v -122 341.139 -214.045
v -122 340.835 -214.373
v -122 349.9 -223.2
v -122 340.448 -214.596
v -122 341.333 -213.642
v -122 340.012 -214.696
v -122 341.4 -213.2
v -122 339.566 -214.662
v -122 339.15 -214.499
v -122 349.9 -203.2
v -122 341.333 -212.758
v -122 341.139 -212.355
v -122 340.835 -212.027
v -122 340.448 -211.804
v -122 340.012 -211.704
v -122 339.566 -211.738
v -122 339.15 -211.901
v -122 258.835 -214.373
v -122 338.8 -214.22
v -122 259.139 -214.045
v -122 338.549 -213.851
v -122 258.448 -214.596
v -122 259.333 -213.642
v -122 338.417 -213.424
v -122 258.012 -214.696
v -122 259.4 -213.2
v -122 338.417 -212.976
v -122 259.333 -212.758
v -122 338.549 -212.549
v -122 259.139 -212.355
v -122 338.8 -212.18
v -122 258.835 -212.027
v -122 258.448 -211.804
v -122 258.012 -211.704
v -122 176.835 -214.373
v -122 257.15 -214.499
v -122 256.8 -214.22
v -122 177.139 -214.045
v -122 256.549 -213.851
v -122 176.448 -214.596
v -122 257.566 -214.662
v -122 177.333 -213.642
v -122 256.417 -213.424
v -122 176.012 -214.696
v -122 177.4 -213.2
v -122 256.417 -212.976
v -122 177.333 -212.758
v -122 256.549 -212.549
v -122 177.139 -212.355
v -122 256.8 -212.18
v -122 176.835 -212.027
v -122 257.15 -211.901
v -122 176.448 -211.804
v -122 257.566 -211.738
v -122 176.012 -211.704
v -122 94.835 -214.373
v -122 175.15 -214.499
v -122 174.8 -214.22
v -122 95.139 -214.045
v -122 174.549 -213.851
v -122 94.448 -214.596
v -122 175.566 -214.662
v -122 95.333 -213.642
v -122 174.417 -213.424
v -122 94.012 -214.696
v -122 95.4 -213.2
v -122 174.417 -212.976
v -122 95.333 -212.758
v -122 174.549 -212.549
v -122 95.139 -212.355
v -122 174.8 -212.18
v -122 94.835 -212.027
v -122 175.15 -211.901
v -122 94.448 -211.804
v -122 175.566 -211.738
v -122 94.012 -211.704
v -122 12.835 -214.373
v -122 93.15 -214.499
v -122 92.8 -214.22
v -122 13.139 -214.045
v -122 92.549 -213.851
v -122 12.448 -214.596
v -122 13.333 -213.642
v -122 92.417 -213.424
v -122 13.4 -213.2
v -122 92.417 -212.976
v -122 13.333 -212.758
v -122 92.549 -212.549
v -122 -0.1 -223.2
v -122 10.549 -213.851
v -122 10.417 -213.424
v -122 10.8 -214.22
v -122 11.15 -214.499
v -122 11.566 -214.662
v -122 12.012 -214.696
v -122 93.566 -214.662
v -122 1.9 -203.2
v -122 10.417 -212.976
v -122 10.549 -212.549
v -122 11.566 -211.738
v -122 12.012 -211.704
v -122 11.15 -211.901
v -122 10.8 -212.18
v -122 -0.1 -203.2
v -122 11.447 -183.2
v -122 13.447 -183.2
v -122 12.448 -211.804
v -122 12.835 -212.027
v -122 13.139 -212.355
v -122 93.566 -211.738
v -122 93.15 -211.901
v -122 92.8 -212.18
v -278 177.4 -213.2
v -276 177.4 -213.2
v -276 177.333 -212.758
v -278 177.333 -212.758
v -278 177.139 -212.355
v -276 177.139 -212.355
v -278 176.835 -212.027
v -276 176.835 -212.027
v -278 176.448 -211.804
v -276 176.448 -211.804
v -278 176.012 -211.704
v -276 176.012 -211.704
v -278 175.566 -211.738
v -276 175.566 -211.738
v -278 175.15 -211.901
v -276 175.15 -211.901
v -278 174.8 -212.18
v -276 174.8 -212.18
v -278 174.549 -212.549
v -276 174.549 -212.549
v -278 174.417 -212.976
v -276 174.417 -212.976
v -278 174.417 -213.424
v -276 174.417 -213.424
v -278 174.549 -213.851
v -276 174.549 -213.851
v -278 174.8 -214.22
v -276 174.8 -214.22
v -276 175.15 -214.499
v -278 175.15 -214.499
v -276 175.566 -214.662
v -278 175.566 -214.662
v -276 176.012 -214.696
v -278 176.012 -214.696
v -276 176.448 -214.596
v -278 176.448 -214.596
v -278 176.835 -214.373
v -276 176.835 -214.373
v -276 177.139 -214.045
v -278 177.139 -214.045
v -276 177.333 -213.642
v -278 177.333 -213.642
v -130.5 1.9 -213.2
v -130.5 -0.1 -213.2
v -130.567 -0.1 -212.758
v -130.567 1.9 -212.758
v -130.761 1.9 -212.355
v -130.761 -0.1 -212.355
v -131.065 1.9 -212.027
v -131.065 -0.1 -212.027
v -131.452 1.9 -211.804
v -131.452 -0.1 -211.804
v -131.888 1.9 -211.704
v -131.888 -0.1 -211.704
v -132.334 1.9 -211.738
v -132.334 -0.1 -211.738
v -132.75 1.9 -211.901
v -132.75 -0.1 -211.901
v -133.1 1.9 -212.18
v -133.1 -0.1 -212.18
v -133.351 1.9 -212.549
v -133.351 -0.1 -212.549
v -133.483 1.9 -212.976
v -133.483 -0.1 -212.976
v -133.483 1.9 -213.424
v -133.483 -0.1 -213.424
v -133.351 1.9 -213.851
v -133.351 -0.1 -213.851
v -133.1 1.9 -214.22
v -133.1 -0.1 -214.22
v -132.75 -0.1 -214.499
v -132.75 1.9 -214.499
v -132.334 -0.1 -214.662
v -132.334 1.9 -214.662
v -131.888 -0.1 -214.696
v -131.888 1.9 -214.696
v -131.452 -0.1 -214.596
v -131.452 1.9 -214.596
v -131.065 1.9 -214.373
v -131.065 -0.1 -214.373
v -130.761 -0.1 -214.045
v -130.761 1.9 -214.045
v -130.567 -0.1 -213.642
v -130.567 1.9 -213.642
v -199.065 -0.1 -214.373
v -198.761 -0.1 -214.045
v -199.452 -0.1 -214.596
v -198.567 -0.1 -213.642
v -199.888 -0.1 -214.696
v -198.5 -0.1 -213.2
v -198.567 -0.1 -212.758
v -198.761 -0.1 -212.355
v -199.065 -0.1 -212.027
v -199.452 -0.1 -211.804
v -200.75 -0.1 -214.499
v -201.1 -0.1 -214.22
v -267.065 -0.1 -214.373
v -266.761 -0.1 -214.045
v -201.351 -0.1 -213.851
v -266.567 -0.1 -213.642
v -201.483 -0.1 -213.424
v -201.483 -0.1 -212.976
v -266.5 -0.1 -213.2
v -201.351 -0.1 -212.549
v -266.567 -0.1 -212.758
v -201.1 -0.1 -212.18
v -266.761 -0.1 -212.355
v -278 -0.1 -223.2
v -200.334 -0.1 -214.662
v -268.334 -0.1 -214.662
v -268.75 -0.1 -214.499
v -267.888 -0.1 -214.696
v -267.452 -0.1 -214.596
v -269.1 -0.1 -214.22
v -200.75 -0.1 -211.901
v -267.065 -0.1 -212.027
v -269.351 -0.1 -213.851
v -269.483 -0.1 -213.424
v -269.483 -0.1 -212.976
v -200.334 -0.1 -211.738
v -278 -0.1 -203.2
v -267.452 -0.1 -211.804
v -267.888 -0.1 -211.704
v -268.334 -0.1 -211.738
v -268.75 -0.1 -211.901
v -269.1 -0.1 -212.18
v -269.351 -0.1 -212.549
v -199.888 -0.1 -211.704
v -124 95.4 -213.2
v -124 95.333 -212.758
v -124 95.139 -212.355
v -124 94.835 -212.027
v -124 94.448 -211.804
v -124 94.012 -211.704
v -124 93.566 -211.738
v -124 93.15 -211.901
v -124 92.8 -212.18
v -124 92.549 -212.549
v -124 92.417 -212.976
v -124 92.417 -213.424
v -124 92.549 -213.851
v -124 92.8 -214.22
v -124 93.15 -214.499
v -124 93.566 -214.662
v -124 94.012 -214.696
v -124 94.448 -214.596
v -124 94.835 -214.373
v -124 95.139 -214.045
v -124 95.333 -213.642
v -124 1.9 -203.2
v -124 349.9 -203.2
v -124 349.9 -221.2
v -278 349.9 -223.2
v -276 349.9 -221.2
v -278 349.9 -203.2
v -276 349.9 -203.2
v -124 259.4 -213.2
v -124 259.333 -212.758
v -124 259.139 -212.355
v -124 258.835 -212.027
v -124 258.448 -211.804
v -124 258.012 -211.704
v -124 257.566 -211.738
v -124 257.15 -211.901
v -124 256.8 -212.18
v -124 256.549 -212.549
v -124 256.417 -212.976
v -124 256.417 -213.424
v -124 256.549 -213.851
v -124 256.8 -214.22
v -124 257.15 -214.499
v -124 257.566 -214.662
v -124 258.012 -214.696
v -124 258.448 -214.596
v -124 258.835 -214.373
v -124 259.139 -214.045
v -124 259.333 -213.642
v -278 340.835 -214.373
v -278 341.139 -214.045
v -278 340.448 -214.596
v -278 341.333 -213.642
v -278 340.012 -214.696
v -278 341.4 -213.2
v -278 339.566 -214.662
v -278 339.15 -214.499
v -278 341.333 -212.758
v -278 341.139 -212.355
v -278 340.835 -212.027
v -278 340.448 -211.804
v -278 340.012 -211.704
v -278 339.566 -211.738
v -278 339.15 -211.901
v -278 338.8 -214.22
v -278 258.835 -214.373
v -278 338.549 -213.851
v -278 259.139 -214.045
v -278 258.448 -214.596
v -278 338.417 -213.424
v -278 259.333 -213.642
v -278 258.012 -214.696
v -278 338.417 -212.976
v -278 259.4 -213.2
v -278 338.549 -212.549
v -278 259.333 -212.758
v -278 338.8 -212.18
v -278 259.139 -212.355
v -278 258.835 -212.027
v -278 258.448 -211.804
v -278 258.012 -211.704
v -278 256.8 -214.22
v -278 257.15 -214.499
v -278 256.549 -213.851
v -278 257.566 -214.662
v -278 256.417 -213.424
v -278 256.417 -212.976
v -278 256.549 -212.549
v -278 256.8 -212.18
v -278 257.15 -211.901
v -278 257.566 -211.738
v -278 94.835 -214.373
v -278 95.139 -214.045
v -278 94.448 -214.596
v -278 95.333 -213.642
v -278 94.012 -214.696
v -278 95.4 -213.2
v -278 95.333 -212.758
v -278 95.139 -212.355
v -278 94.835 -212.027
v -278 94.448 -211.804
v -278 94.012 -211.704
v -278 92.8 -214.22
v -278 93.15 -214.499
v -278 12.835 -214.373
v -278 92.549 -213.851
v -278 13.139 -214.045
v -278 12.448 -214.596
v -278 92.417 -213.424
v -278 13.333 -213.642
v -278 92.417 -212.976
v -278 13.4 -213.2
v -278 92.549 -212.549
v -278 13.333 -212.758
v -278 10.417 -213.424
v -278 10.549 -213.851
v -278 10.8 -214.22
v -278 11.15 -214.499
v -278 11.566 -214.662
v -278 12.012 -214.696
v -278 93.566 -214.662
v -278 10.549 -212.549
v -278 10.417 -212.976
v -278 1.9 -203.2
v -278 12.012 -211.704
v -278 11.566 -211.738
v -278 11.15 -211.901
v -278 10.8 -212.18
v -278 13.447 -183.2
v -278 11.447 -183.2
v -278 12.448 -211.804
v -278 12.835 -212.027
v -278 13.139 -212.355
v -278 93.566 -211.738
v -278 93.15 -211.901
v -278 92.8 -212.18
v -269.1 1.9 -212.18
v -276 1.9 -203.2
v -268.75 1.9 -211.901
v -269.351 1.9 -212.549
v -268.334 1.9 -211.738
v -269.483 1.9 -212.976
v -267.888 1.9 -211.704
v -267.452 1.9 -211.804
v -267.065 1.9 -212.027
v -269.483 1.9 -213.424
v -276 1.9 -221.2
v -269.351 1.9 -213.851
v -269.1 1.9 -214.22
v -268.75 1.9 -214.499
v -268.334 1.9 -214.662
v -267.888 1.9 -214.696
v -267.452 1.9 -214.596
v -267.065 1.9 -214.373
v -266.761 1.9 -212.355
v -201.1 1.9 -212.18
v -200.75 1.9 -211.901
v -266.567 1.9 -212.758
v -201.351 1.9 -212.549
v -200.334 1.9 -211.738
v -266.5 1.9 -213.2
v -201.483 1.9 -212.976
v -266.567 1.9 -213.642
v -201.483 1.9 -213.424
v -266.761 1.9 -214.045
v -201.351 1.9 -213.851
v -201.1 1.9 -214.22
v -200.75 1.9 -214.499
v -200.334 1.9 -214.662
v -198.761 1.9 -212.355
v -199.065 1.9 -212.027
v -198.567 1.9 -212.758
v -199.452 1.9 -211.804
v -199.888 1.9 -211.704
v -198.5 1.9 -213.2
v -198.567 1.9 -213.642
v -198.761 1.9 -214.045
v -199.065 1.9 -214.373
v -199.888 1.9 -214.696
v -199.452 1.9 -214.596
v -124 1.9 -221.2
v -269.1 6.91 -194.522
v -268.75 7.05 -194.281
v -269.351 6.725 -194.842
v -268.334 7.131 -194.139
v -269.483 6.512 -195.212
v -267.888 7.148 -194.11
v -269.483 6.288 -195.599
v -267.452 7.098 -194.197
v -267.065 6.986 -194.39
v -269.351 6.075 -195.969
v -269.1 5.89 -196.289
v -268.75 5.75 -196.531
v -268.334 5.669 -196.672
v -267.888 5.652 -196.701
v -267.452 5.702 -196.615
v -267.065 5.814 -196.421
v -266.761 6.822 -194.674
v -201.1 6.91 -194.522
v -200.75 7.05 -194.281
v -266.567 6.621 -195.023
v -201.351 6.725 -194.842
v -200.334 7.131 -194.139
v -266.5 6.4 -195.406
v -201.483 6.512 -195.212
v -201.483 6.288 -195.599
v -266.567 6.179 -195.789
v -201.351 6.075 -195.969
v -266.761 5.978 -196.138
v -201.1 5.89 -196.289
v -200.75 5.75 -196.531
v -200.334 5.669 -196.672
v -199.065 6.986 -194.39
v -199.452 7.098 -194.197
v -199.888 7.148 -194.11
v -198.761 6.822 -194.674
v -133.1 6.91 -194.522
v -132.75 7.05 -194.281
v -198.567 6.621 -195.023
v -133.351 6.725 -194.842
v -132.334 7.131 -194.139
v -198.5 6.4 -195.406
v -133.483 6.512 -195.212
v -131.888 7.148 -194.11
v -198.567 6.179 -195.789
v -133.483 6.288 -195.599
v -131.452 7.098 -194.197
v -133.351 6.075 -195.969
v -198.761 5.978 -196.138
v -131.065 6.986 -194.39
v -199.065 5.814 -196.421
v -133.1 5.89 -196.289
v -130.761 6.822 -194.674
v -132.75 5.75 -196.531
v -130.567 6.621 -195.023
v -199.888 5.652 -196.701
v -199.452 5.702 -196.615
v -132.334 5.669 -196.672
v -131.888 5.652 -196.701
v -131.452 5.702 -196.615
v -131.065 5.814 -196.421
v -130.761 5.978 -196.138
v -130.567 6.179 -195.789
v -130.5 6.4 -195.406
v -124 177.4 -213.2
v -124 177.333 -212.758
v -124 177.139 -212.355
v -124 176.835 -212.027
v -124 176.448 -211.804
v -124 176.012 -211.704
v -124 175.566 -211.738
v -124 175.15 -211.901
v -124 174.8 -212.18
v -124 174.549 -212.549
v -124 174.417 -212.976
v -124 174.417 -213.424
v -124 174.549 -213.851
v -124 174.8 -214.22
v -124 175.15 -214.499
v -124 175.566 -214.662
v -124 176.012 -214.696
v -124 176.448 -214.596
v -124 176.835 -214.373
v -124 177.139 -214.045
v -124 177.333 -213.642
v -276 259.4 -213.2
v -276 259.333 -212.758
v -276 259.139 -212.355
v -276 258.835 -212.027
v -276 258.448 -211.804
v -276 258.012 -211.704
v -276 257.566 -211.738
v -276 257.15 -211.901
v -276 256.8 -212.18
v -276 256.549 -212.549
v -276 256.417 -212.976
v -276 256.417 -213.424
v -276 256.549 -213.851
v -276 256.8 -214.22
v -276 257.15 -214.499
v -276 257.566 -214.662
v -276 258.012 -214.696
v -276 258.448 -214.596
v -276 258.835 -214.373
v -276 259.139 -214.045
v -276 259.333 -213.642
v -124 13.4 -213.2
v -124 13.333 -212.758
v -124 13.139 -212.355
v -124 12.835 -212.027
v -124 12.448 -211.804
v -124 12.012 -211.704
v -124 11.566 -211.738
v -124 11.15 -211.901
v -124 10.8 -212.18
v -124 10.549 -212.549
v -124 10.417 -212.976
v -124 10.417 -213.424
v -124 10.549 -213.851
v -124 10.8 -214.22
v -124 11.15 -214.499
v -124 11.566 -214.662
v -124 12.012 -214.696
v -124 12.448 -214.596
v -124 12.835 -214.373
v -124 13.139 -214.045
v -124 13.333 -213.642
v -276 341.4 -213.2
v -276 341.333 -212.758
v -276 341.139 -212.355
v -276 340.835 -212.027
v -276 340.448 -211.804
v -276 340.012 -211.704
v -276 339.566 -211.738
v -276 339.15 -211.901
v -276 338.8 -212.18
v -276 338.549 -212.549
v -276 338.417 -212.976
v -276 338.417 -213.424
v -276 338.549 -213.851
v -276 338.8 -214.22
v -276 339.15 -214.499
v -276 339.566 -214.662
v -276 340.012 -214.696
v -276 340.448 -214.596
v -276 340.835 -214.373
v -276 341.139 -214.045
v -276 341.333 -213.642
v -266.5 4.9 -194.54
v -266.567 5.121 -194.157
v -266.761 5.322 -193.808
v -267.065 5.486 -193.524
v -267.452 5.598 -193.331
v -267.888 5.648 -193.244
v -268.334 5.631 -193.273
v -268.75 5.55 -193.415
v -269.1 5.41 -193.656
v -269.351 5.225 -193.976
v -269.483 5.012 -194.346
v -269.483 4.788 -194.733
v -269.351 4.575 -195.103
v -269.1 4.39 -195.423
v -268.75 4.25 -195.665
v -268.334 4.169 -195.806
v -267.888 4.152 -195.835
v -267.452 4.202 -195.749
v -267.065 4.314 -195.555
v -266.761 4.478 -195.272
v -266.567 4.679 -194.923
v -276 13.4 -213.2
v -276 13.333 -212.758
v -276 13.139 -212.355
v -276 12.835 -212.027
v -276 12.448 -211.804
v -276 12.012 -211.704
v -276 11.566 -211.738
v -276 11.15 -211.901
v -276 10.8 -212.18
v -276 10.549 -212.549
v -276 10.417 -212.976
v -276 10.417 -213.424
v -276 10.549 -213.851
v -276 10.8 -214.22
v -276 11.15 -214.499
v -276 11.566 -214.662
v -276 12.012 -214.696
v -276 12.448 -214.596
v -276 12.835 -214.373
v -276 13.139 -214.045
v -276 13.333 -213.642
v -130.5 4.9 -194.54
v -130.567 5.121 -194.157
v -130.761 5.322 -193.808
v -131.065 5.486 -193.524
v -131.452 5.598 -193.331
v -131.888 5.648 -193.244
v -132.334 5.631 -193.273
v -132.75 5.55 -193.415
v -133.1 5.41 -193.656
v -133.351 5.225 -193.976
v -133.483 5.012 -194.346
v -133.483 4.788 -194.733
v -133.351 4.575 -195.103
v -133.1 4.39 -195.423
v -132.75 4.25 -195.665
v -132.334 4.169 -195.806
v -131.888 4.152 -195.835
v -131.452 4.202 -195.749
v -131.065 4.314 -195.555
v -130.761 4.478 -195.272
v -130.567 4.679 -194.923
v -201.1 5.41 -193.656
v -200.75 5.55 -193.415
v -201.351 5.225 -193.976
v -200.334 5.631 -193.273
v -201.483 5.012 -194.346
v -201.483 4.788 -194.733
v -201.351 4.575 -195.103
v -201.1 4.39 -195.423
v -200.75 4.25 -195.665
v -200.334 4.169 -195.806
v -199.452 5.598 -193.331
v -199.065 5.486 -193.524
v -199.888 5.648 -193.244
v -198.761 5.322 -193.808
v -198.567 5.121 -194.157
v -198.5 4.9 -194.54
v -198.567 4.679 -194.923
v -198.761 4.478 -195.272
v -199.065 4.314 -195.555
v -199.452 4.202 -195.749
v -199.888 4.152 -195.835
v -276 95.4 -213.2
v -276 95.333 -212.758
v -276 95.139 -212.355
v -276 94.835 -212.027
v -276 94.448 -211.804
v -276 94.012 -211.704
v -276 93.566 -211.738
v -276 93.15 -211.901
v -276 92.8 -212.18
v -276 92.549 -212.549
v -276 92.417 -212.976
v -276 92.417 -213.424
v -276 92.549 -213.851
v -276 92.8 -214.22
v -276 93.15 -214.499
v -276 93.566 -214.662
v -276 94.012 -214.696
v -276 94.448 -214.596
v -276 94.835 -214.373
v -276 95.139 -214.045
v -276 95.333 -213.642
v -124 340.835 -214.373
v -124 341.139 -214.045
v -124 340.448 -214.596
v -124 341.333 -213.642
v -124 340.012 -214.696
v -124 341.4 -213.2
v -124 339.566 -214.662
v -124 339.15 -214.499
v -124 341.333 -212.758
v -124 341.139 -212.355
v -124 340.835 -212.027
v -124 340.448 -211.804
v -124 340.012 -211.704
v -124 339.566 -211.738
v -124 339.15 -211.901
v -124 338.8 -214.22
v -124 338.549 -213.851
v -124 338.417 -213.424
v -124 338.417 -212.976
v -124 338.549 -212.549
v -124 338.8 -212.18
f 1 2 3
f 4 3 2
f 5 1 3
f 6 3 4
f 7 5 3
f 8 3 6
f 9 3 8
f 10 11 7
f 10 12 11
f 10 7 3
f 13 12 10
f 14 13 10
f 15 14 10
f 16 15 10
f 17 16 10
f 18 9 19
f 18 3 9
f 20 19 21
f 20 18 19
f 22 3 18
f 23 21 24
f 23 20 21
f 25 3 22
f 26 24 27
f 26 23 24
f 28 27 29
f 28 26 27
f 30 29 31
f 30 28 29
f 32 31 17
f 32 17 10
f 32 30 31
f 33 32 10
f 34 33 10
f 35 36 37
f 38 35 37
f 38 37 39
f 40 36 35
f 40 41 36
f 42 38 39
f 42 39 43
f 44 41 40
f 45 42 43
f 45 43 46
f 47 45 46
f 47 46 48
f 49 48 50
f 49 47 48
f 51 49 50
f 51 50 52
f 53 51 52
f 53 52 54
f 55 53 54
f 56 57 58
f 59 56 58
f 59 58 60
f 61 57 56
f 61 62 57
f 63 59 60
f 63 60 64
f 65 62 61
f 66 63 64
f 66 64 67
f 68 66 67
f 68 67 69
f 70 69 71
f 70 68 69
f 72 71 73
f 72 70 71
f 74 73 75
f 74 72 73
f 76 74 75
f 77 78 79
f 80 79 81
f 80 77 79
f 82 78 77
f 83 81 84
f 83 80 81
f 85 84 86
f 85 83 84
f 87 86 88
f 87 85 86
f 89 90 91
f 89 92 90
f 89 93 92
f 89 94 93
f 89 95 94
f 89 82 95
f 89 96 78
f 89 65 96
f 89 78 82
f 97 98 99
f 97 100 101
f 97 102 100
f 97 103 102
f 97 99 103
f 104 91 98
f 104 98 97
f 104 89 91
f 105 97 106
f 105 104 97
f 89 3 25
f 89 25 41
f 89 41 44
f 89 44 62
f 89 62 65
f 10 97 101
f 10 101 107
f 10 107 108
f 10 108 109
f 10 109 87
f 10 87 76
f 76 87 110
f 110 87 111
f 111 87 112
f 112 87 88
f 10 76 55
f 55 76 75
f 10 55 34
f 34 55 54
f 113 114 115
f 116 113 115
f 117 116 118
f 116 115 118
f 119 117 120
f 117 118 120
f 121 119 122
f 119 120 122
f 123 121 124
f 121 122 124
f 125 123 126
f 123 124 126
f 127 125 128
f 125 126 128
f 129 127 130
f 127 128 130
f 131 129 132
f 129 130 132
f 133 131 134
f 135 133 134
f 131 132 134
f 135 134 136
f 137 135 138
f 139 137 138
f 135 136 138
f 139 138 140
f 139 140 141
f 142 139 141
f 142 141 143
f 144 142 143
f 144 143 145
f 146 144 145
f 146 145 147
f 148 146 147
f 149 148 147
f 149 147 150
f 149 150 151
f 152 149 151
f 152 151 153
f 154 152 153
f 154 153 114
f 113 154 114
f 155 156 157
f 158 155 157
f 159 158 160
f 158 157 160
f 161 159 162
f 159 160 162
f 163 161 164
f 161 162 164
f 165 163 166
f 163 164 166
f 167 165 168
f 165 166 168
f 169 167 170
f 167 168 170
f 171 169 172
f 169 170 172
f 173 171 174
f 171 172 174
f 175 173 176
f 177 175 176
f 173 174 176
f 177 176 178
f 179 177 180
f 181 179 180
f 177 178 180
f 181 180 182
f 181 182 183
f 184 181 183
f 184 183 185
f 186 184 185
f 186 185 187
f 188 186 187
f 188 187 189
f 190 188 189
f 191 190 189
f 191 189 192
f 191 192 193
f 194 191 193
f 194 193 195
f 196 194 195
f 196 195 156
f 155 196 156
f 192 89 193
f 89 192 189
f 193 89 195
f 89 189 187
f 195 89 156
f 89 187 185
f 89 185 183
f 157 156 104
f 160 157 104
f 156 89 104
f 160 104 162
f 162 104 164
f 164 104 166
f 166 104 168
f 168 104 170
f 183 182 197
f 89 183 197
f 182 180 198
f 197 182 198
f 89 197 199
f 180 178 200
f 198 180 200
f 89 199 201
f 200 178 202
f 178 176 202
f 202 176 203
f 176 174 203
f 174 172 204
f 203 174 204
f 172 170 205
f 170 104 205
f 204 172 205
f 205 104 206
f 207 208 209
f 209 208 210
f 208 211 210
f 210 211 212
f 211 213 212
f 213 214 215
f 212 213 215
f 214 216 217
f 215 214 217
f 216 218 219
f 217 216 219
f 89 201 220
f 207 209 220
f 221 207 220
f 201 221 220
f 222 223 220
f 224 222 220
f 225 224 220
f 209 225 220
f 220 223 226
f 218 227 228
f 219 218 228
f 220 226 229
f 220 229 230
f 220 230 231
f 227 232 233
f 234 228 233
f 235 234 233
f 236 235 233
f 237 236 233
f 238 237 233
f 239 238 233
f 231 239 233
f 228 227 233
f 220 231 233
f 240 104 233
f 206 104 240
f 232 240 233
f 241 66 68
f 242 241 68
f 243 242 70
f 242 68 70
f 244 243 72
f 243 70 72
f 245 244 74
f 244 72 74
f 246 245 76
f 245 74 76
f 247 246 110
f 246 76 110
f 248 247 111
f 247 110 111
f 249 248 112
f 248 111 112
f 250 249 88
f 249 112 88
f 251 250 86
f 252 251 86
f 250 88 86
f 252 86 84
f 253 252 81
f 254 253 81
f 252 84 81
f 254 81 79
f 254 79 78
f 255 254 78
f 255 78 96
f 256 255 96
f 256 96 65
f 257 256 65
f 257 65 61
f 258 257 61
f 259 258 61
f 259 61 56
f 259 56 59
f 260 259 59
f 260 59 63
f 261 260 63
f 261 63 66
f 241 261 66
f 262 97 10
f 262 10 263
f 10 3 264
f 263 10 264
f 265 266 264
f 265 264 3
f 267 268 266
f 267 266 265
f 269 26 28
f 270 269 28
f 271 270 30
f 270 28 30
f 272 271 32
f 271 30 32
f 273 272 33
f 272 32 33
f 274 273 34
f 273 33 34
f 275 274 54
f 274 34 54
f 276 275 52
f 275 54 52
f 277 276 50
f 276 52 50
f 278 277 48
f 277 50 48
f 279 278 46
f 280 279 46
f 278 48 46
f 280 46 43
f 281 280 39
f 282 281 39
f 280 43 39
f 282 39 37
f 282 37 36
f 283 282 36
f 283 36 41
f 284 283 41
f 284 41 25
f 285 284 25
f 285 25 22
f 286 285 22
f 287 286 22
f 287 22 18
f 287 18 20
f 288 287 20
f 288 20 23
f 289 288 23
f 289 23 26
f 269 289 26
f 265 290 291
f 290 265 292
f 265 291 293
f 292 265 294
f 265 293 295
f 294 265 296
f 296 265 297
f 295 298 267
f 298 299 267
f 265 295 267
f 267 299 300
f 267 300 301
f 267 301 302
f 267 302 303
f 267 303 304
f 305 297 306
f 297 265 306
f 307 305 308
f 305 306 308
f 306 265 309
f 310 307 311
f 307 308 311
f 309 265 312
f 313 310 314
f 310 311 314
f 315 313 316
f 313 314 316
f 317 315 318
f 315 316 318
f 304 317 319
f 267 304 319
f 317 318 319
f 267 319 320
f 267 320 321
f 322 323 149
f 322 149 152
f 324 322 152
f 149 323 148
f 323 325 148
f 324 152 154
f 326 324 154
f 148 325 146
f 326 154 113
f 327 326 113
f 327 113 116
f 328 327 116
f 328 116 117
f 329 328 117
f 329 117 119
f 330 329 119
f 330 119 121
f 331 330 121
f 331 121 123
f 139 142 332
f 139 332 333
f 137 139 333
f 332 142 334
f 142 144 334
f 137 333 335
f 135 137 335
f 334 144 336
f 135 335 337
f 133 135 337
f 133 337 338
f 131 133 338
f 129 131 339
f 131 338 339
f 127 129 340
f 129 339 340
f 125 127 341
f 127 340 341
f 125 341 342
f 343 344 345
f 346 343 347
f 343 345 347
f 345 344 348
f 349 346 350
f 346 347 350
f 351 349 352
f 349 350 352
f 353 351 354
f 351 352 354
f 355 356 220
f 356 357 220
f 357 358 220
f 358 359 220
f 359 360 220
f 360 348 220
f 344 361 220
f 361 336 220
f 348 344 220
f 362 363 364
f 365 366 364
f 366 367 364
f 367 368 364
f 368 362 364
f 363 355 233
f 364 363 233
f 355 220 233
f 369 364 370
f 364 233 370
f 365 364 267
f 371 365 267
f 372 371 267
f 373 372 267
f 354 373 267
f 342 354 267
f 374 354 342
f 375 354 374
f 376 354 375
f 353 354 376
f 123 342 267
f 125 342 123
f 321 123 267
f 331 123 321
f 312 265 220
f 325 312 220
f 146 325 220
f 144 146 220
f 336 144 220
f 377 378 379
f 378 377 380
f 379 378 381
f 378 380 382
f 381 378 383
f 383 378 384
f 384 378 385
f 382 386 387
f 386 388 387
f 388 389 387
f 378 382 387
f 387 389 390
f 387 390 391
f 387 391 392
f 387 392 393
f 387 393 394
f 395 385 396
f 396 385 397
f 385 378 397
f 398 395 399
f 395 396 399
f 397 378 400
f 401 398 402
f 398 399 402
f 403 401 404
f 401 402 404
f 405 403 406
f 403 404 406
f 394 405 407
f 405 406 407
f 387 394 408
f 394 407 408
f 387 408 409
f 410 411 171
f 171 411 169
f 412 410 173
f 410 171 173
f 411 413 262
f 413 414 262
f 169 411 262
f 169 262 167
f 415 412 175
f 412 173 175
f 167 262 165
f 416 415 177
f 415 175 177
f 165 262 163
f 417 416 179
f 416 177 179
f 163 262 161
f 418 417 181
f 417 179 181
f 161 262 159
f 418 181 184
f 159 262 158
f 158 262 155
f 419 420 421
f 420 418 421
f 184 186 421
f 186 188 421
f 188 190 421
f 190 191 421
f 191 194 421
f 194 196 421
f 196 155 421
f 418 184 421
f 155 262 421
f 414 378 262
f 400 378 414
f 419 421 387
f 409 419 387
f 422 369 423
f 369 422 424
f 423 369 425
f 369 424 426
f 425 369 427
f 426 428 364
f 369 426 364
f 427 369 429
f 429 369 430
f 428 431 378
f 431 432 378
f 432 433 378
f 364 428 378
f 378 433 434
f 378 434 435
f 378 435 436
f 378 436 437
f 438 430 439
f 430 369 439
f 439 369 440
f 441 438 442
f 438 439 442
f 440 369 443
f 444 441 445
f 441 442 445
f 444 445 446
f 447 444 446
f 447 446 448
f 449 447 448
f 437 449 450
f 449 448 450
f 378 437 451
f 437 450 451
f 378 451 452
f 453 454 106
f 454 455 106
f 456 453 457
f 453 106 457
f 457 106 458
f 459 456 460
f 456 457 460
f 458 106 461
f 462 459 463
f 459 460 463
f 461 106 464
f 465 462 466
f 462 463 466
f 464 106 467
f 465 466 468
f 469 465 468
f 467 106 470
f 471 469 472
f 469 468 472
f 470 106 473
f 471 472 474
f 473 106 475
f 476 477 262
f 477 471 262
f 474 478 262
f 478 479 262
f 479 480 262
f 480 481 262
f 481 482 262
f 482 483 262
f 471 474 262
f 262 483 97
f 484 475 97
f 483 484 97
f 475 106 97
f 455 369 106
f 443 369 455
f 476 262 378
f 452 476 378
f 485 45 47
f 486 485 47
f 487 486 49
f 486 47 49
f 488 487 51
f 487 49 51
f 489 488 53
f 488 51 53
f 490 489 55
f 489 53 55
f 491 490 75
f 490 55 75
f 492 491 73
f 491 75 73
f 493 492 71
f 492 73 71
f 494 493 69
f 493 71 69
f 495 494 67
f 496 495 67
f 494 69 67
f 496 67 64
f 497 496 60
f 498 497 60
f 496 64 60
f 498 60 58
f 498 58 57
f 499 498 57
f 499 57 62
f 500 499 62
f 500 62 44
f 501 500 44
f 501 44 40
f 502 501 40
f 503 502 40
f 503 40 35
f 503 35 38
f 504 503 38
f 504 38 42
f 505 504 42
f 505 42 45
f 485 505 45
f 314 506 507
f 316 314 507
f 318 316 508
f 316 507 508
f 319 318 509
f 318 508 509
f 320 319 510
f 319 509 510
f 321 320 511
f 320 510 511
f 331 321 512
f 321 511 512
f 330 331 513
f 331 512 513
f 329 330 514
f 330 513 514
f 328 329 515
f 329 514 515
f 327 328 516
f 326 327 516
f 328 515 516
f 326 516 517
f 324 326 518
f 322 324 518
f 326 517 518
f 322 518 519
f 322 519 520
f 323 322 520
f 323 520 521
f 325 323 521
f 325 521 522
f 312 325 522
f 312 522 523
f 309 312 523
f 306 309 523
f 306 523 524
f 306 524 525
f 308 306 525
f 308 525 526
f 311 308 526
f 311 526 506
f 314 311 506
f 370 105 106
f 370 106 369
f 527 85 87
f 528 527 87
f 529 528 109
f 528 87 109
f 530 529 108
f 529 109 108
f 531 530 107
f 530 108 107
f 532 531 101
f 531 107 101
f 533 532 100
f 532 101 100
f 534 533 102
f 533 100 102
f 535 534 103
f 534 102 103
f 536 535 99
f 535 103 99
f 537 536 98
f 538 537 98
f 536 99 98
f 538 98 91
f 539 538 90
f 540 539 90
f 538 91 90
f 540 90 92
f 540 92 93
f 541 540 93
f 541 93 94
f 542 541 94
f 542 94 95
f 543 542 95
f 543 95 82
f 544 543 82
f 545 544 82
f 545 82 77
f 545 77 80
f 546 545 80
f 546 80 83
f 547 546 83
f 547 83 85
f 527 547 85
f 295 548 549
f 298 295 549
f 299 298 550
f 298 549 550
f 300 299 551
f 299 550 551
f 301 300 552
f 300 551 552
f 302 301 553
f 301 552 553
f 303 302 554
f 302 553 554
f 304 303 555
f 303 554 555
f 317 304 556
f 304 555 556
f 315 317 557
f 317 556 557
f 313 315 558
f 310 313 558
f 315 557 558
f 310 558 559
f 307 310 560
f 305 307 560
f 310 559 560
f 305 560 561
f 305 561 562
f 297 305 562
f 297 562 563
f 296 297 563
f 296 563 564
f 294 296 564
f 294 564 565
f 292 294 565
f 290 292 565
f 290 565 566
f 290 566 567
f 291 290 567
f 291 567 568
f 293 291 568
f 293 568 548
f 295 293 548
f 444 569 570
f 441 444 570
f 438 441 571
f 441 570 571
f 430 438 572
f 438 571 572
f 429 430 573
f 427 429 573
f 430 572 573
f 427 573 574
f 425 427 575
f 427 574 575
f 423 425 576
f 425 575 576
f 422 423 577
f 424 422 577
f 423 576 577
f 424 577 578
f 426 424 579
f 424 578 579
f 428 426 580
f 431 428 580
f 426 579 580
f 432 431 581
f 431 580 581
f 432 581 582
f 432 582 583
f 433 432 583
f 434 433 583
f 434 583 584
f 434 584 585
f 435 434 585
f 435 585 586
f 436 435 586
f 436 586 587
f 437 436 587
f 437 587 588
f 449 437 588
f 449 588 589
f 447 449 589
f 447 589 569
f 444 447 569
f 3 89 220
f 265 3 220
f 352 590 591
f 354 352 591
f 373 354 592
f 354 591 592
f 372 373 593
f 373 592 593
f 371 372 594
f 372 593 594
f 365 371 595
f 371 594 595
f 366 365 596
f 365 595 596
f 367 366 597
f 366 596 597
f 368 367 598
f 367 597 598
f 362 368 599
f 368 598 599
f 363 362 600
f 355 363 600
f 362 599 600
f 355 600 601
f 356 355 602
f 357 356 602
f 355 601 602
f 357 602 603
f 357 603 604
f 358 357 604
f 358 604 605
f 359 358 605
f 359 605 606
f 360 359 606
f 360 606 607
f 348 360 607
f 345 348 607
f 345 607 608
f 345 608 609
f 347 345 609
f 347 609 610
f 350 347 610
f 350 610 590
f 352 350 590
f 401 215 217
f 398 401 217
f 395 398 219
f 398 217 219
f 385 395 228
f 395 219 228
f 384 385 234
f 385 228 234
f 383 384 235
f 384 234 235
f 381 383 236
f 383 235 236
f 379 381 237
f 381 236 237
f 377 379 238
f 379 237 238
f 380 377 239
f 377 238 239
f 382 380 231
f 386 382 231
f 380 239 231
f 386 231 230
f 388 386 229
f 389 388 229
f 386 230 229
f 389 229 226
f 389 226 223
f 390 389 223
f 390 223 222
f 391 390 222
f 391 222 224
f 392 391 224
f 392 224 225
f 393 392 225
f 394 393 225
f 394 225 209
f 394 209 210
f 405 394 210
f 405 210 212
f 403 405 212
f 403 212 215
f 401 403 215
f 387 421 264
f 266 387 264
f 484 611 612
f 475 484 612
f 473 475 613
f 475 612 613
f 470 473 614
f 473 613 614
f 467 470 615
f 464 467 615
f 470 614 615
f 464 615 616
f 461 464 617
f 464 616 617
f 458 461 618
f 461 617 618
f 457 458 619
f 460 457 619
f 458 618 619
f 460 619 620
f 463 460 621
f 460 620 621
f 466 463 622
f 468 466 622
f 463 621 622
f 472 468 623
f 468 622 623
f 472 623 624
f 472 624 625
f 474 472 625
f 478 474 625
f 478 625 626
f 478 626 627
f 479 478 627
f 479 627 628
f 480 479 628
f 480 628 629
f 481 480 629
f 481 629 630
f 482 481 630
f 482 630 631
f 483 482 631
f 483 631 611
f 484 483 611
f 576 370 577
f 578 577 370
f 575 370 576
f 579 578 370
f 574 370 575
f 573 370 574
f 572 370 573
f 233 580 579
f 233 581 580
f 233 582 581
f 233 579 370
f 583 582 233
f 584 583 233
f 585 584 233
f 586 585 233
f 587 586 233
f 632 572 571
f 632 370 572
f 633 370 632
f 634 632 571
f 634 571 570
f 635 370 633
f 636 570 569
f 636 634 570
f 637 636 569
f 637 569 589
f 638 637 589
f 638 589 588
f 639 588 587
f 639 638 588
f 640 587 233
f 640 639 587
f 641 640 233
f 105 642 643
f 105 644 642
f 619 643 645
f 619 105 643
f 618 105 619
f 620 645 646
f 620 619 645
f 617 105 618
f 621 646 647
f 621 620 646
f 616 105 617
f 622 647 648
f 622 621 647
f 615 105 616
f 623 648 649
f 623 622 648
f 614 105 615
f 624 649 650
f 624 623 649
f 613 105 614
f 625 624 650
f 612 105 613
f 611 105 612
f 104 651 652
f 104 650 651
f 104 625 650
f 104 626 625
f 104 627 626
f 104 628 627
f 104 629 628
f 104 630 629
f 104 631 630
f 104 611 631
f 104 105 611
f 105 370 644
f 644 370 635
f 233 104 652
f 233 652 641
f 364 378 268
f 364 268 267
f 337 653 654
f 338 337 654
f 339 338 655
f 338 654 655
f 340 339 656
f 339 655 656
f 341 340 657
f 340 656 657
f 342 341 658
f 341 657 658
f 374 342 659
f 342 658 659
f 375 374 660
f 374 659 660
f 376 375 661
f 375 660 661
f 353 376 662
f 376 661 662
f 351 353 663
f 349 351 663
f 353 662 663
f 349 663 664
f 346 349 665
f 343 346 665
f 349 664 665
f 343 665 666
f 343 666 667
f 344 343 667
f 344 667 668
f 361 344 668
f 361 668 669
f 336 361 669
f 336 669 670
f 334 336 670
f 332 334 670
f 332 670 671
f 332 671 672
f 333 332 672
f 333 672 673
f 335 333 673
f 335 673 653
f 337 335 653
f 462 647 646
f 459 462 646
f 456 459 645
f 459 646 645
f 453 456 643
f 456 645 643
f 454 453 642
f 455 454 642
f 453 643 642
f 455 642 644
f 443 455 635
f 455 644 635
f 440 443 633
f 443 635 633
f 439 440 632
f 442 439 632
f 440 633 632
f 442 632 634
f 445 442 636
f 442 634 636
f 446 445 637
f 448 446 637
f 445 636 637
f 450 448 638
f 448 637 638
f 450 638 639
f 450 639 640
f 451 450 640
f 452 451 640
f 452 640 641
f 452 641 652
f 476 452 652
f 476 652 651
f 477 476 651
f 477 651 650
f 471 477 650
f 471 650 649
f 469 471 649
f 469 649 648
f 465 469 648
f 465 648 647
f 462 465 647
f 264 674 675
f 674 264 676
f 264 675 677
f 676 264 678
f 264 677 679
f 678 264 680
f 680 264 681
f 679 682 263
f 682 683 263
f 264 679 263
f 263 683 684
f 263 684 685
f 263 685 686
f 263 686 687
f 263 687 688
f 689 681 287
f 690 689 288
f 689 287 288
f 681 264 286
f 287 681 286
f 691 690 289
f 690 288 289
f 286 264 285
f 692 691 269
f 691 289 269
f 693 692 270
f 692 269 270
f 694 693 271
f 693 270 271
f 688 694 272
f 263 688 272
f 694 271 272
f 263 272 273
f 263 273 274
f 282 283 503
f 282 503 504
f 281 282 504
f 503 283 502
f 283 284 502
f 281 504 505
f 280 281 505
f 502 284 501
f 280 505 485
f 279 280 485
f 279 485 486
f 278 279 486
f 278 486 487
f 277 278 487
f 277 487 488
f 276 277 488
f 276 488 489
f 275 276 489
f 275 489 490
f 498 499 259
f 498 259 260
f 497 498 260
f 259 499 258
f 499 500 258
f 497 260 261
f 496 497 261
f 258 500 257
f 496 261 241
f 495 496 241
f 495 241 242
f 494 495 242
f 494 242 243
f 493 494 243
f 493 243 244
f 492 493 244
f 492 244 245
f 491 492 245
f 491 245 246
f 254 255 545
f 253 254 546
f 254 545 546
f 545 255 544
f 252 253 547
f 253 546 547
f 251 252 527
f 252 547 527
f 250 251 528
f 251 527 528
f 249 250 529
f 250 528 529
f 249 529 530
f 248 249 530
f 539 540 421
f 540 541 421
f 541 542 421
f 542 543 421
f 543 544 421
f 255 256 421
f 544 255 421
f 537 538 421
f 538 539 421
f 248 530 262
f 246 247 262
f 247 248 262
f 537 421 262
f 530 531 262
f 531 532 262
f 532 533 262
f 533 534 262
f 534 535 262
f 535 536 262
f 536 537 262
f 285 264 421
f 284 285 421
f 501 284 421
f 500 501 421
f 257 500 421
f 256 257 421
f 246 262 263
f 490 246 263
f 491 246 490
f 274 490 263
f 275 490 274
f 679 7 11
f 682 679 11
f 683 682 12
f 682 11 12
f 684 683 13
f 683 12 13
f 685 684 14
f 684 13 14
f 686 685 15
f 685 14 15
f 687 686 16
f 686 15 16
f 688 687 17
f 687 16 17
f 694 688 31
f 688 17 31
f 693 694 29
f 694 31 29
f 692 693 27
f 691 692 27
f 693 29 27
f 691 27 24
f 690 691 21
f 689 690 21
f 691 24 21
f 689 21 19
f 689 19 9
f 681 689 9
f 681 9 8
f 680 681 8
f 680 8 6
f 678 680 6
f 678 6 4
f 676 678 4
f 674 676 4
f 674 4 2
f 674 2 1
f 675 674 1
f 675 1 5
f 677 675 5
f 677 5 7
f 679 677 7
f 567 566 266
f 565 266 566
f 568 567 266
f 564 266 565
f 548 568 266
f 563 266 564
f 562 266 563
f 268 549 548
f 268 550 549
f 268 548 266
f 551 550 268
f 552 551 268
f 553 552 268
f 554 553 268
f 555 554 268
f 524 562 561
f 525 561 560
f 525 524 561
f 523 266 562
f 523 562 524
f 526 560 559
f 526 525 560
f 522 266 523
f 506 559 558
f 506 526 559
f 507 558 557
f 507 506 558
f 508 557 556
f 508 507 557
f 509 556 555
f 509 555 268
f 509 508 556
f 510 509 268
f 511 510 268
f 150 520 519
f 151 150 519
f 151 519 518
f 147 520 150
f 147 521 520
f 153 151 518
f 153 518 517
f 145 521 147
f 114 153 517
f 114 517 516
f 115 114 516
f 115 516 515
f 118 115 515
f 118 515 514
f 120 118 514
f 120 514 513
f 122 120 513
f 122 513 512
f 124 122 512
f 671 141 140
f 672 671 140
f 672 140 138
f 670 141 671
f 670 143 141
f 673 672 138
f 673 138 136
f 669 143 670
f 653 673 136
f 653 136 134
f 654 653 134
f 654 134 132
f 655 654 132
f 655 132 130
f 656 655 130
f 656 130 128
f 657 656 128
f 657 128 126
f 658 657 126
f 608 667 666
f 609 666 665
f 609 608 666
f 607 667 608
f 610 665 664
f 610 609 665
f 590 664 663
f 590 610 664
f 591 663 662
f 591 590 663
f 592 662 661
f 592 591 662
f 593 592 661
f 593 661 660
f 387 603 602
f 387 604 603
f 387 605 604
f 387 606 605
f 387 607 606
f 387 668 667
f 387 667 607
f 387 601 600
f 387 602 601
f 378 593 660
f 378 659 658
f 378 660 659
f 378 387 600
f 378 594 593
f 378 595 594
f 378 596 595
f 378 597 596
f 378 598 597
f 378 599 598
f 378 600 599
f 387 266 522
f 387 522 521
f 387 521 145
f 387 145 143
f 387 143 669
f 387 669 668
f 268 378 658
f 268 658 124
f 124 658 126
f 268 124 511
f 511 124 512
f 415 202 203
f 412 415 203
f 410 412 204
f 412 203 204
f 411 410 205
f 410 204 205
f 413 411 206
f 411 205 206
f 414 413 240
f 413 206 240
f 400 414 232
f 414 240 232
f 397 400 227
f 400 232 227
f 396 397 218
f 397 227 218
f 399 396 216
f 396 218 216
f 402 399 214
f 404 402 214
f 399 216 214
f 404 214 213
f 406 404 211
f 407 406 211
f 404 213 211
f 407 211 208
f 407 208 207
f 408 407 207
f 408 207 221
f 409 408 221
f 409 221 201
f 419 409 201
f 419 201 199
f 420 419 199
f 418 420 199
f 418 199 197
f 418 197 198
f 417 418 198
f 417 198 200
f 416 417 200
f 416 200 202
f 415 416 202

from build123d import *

# Parameters (mm, degrees)
SKETCH057_W     = 156
SKETCH057_H     = 40
PAD017_DEPTH    = 350
POCKET035_DEPTH = 156.001
SKETCH059_R     = 1.5
POCKET036_DEPTH = 5
SKETCH060_R     = 1.5
POCKET037_DEPTH = 5
SKETCH061_W     = 2
SKETCH061_H     = 18
PAD018_DEPTH    = 348
SKETCH062_R     = 1.5
POCKET038_DEPTH = 156.001


with BuildPart() as part:
    # Sketch057 (on Face1 of Binder015) → Pad017 (new body)
    with BuildSketch(Plane(origin=(0, -0.1, 0), x_dir=(-1, 0, 0), z_dir=(0, 1, 0))):
        with Locations((200, -203.2)):
            Rectangle(SKETCH057_W, SKETCH057_H)
    extrude(amount=PAD017_DEPTH)

    # Sketch058 (on Face4 of Binder015) → Pocket035 (cut, through all)
    with BuildSketch(Plane(origin=(-122, 0, 0), x_dir=(0, -1, 0), z_dir=(-1, 0, 0))):
        Polygon((-13.4470053838, -183.2), (-1.9, -203.2), (-1.9, -221.2), (-349.9, -221.2), (-349.9, -183.2), align=None)
        Polygon((0.1, -183.2), (-11.4470053838, -183.2), (0.1, -203.2), align=None)
    extrude(amount=POCKET035_DEPTH, mode=Mode.SUBTRACT)

    # Sketch059 (on Face6 of Pocket035) → Pocket036 (cut)
    with BuildSketch(Plane(origin=(0, 87.9131810245, -50.7566987298), x_dir=(1, 0, 0), z_dir=(0, -0.8660254038, 0.5))):
        with Locations((-200, -166.026362)):
            Circle(SKETCH059_R)
        with Locations((-268, -166.026362)):
            Circle(SKETCH059_R)
        with Locations((-132, -166.026362)):
            Circle(SKETCH059_R)
    extrude(amount=-POCKET036_DEPTH, mode=Mode.SUBTRACT)

    # Sketch060 (on Face4 of Pocket036) → Pocket037 (cut)
    with BuildSketch(Plane.XZ.offset(0.1)):
        with Locations((-200, -213.2)):
            Circle(SKETCH060_R)
        with Locations((-268, -213.2)):
            Circle(SKETCH060_R)
        with Locations((-132, -213.2)):
            Circle(SKETCH060_R)
    extrude(amount=-POCKET037_DEPTH, mode=Mode.SUBTRACT)

    # Sketch061 (on Face8 of Pocket037) → Pad018 (join)
    with BuildSketch(Plane(origin=(0, 1.9, 0), x_dir=(-1, 0, 0), z_dir=(0, 1, 0))):
        with Locations((277, -212.2)):
            Rectangle(SKETCH061_W, SKETCH061_H)
        with Locations((123, -212.2)):
            Rectangle(SKETCH061_W, SKETCH061_H)
    extrude(amount=PAD018_DEPTH)

    # Sketch062 (on Face18 of Pad018) → Pocket038 (cut, through all)
    with BuildSketch(Plane.YZ.offset(-122)):
        with Locations((257.9, -213.2)):
            Circle(SKETCH062_R)
        with Locations((339.9, -213.2)):
            Circle(SKETCH062_R)
        with Locations((175.9, -213.2)):
            Circle(SKETCH062_R)
        with Locations((93.9, -213.2)):
            Circle(SKETCH062_R)
        with Locations((11.9, -213.2)):
            Circle(SKETCH062_R)
    extrude(amount=-POCKET038_DEPTH, mode=Mode.SUBTRACT)


solid = part.part
